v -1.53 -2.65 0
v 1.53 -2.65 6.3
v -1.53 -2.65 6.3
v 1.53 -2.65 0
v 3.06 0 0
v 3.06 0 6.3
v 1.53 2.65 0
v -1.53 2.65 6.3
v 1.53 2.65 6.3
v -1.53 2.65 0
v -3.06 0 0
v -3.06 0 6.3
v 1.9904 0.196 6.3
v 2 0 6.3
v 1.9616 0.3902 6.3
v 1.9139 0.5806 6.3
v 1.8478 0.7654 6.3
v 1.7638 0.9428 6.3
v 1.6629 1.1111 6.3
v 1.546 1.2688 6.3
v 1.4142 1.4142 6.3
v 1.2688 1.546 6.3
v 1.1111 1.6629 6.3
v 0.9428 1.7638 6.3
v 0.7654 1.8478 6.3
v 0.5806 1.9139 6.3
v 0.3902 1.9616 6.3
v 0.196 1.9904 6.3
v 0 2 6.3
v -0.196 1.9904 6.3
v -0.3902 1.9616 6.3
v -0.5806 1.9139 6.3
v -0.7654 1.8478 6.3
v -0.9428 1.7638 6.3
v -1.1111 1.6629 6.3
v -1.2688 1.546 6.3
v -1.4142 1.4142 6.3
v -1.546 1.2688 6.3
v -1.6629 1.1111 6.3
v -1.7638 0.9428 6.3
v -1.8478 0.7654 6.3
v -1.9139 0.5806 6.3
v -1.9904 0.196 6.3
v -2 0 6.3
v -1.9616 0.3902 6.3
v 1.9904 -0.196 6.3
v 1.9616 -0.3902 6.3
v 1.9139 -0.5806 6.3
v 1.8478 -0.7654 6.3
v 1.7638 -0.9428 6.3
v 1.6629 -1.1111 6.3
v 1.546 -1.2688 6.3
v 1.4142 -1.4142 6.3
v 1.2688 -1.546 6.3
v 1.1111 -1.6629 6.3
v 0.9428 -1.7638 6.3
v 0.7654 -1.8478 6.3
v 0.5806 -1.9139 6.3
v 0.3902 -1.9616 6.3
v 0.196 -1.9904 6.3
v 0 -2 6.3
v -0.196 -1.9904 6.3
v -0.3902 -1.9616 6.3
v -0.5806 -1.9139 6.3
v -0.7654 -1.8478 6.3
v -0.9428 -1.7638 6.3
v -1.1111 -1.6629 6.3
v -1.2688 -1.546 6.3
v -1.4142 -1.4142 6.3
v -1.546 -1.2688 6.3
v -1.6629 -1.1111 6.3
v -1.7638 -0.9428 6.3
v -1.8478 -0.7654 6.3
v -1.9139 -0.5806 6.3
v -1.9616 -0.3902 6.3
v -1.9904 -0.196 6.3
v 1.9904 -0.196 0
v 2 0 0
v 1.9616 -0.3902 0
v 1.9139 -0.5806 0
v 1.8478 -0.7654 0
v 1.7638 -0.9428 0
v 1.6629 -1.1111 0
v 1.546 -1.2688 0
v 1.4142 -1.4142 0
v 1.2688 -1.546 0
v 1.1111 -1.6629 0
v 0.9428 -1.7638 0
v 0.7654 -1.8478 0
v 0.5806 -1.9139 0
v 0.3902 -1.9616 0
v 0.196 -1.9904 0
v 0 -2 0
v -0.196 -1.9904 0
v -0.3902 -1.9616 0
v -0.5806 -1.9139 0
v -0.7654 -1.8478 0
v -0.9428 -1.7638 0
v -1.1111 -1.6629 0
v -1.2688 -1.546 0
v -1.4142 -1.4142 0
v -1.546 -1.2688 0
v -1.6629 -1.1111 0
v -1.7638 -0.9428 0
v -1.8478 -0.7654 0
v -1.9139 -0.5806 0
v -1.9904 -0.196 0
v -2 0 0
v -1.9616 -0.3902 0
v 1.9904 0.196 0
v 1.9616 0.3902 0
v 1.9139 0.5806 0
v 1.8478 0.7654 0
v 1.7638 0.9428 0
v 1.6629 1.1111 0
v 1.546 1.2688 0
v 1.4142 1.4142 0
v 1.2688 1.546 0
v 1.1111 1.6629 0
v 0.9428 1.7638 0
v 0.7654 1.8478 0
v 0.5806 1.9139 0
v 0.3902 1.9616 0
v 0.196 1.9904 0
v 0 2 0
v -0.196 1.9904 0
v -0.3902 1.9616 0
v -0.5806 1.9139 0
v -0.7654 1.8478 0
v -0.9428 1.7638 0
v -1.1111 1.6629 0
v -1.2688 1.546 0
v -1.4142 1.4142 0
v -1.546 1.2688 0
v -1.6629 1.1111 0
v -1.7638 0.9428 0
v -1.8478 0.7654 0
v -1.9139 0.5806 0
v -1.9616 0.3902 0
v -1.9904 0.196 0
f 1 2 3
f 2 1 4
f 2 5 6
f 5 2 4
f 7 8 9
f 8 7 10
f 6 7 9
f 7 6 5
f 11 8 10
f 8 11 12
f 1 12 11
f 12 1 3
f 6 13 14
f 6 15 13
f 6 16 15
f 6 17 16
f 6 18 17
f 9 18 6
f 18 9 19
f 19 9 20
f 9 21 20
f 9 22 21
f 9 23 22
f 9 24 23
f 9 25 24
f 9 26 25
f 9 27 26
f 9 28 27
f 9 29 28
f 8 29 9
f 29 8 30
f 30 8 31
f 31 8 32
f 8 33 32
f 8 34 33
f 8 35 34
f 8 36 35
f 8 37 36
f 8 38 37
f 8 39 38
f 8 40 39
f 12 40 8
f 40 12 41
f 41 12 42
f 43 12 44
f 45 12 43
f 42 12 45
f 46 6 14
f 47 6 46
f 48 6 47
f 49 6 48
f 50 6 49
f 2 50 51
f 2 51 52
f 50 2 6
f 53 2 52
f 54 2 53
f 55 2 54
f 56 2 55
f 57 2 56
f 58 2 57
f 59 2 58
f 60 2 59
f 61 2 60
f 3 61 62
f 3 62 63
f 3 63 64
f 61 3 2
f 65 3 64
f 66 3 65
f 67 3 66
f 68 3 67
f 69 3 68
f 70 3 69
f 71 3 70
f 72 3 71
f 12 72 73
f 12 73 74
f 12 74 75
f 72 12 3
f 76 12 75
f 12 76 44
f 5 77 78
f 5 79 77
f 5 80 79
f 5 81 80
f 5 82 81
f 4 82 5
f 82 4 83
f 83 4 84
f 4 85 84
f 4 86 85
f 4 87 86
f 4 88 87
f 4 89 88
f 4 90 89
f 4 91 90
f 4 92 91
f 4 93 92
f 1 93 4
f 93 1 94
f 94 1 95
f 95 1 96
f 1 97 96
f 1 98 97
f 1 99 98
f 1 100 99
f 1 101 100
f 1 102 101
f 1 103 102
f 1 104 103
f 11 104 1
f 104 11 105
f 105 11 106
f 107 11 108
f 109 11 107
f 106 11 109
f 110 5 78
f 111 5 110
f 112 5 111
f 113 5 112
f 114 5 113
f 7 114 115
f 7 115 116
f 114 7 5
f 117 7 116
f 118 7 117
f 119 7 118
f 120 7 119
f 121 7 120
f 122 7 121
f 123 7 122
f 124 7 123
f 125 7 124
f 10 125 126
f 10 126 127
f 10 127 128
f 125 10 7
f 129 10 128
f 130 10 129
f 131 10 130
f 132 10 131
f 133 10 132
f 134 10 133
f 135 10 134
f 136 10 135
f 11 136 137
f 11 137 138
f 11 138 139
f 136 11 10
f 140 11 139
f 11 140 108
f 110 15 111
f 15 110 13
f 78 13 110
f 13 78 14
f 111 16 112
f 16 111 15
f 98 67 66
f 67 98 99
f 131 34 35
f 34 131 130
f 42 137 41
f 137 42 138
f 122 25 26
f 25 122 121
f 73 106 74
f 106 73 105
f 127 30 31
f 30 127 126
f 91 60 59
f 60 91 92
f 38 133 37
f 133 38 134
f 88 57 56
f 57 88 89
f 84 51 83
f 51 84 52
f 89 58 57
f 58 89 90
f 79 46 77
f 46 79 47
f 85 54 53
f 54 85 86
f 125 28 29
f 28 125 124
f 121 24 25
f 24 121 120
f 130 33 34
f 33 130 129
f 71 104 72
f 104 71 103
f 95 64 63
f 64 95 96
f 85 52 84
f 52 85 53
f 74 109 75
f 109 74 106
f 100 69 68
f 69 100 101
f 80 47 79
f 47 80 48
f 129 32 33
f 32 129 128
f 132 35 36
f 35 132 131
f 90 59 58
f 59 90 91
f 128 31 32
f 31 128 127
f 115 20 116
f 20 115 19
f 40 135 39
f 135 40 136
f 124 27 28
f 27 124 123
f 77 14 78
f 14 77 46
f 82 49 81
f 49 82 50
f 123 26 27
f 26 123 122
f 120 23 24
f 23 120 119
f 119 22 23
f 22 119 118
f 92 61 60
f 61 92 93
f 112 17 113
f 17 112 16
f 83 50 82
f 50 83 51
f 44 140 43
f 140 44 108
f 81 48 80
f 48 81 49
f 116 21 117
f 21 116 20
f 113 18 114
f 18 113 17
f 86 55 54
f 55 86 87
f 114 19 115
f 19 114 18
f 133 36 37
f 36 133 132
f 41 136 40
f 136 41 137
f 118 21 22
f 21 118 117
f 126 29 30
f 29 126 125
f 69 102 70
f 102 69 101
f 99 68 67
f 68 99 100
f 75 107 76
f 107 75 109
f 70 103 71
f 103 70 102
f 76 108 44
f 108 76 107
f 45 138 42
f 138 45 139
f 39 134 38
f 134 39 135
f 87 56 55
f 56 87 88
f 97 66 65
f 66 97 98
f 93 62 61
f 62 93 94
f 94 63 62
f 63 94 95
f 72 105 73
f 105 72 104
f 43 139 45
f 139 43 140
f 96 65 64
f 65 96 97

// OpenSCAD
$fn = 64;

across_flats = 5.3;     // mm
thickness    = 6.3;     // mm
screw_diam   = 4.0;     // mm

// Circumradius for a regular hex given across-flats:
// across_flats = 2 * R * cos(30°)  =>  R = across_flats / (2*cos(30°))
hex_R = across_flats / (2 * cos(30));

module hex_nut() {
    difference() {
        // Outer hex body
        cylinder(h = thickness, r = hex_R, $fn = 6);

        // Central through-hole (slightly extended to guarantee cut-through)
        translate([0, 0, -0.5])
            cylinder(h = thickness + 1.0, r = screw_diam / 2, $fn = 64);
    }
}

hex_nut();
